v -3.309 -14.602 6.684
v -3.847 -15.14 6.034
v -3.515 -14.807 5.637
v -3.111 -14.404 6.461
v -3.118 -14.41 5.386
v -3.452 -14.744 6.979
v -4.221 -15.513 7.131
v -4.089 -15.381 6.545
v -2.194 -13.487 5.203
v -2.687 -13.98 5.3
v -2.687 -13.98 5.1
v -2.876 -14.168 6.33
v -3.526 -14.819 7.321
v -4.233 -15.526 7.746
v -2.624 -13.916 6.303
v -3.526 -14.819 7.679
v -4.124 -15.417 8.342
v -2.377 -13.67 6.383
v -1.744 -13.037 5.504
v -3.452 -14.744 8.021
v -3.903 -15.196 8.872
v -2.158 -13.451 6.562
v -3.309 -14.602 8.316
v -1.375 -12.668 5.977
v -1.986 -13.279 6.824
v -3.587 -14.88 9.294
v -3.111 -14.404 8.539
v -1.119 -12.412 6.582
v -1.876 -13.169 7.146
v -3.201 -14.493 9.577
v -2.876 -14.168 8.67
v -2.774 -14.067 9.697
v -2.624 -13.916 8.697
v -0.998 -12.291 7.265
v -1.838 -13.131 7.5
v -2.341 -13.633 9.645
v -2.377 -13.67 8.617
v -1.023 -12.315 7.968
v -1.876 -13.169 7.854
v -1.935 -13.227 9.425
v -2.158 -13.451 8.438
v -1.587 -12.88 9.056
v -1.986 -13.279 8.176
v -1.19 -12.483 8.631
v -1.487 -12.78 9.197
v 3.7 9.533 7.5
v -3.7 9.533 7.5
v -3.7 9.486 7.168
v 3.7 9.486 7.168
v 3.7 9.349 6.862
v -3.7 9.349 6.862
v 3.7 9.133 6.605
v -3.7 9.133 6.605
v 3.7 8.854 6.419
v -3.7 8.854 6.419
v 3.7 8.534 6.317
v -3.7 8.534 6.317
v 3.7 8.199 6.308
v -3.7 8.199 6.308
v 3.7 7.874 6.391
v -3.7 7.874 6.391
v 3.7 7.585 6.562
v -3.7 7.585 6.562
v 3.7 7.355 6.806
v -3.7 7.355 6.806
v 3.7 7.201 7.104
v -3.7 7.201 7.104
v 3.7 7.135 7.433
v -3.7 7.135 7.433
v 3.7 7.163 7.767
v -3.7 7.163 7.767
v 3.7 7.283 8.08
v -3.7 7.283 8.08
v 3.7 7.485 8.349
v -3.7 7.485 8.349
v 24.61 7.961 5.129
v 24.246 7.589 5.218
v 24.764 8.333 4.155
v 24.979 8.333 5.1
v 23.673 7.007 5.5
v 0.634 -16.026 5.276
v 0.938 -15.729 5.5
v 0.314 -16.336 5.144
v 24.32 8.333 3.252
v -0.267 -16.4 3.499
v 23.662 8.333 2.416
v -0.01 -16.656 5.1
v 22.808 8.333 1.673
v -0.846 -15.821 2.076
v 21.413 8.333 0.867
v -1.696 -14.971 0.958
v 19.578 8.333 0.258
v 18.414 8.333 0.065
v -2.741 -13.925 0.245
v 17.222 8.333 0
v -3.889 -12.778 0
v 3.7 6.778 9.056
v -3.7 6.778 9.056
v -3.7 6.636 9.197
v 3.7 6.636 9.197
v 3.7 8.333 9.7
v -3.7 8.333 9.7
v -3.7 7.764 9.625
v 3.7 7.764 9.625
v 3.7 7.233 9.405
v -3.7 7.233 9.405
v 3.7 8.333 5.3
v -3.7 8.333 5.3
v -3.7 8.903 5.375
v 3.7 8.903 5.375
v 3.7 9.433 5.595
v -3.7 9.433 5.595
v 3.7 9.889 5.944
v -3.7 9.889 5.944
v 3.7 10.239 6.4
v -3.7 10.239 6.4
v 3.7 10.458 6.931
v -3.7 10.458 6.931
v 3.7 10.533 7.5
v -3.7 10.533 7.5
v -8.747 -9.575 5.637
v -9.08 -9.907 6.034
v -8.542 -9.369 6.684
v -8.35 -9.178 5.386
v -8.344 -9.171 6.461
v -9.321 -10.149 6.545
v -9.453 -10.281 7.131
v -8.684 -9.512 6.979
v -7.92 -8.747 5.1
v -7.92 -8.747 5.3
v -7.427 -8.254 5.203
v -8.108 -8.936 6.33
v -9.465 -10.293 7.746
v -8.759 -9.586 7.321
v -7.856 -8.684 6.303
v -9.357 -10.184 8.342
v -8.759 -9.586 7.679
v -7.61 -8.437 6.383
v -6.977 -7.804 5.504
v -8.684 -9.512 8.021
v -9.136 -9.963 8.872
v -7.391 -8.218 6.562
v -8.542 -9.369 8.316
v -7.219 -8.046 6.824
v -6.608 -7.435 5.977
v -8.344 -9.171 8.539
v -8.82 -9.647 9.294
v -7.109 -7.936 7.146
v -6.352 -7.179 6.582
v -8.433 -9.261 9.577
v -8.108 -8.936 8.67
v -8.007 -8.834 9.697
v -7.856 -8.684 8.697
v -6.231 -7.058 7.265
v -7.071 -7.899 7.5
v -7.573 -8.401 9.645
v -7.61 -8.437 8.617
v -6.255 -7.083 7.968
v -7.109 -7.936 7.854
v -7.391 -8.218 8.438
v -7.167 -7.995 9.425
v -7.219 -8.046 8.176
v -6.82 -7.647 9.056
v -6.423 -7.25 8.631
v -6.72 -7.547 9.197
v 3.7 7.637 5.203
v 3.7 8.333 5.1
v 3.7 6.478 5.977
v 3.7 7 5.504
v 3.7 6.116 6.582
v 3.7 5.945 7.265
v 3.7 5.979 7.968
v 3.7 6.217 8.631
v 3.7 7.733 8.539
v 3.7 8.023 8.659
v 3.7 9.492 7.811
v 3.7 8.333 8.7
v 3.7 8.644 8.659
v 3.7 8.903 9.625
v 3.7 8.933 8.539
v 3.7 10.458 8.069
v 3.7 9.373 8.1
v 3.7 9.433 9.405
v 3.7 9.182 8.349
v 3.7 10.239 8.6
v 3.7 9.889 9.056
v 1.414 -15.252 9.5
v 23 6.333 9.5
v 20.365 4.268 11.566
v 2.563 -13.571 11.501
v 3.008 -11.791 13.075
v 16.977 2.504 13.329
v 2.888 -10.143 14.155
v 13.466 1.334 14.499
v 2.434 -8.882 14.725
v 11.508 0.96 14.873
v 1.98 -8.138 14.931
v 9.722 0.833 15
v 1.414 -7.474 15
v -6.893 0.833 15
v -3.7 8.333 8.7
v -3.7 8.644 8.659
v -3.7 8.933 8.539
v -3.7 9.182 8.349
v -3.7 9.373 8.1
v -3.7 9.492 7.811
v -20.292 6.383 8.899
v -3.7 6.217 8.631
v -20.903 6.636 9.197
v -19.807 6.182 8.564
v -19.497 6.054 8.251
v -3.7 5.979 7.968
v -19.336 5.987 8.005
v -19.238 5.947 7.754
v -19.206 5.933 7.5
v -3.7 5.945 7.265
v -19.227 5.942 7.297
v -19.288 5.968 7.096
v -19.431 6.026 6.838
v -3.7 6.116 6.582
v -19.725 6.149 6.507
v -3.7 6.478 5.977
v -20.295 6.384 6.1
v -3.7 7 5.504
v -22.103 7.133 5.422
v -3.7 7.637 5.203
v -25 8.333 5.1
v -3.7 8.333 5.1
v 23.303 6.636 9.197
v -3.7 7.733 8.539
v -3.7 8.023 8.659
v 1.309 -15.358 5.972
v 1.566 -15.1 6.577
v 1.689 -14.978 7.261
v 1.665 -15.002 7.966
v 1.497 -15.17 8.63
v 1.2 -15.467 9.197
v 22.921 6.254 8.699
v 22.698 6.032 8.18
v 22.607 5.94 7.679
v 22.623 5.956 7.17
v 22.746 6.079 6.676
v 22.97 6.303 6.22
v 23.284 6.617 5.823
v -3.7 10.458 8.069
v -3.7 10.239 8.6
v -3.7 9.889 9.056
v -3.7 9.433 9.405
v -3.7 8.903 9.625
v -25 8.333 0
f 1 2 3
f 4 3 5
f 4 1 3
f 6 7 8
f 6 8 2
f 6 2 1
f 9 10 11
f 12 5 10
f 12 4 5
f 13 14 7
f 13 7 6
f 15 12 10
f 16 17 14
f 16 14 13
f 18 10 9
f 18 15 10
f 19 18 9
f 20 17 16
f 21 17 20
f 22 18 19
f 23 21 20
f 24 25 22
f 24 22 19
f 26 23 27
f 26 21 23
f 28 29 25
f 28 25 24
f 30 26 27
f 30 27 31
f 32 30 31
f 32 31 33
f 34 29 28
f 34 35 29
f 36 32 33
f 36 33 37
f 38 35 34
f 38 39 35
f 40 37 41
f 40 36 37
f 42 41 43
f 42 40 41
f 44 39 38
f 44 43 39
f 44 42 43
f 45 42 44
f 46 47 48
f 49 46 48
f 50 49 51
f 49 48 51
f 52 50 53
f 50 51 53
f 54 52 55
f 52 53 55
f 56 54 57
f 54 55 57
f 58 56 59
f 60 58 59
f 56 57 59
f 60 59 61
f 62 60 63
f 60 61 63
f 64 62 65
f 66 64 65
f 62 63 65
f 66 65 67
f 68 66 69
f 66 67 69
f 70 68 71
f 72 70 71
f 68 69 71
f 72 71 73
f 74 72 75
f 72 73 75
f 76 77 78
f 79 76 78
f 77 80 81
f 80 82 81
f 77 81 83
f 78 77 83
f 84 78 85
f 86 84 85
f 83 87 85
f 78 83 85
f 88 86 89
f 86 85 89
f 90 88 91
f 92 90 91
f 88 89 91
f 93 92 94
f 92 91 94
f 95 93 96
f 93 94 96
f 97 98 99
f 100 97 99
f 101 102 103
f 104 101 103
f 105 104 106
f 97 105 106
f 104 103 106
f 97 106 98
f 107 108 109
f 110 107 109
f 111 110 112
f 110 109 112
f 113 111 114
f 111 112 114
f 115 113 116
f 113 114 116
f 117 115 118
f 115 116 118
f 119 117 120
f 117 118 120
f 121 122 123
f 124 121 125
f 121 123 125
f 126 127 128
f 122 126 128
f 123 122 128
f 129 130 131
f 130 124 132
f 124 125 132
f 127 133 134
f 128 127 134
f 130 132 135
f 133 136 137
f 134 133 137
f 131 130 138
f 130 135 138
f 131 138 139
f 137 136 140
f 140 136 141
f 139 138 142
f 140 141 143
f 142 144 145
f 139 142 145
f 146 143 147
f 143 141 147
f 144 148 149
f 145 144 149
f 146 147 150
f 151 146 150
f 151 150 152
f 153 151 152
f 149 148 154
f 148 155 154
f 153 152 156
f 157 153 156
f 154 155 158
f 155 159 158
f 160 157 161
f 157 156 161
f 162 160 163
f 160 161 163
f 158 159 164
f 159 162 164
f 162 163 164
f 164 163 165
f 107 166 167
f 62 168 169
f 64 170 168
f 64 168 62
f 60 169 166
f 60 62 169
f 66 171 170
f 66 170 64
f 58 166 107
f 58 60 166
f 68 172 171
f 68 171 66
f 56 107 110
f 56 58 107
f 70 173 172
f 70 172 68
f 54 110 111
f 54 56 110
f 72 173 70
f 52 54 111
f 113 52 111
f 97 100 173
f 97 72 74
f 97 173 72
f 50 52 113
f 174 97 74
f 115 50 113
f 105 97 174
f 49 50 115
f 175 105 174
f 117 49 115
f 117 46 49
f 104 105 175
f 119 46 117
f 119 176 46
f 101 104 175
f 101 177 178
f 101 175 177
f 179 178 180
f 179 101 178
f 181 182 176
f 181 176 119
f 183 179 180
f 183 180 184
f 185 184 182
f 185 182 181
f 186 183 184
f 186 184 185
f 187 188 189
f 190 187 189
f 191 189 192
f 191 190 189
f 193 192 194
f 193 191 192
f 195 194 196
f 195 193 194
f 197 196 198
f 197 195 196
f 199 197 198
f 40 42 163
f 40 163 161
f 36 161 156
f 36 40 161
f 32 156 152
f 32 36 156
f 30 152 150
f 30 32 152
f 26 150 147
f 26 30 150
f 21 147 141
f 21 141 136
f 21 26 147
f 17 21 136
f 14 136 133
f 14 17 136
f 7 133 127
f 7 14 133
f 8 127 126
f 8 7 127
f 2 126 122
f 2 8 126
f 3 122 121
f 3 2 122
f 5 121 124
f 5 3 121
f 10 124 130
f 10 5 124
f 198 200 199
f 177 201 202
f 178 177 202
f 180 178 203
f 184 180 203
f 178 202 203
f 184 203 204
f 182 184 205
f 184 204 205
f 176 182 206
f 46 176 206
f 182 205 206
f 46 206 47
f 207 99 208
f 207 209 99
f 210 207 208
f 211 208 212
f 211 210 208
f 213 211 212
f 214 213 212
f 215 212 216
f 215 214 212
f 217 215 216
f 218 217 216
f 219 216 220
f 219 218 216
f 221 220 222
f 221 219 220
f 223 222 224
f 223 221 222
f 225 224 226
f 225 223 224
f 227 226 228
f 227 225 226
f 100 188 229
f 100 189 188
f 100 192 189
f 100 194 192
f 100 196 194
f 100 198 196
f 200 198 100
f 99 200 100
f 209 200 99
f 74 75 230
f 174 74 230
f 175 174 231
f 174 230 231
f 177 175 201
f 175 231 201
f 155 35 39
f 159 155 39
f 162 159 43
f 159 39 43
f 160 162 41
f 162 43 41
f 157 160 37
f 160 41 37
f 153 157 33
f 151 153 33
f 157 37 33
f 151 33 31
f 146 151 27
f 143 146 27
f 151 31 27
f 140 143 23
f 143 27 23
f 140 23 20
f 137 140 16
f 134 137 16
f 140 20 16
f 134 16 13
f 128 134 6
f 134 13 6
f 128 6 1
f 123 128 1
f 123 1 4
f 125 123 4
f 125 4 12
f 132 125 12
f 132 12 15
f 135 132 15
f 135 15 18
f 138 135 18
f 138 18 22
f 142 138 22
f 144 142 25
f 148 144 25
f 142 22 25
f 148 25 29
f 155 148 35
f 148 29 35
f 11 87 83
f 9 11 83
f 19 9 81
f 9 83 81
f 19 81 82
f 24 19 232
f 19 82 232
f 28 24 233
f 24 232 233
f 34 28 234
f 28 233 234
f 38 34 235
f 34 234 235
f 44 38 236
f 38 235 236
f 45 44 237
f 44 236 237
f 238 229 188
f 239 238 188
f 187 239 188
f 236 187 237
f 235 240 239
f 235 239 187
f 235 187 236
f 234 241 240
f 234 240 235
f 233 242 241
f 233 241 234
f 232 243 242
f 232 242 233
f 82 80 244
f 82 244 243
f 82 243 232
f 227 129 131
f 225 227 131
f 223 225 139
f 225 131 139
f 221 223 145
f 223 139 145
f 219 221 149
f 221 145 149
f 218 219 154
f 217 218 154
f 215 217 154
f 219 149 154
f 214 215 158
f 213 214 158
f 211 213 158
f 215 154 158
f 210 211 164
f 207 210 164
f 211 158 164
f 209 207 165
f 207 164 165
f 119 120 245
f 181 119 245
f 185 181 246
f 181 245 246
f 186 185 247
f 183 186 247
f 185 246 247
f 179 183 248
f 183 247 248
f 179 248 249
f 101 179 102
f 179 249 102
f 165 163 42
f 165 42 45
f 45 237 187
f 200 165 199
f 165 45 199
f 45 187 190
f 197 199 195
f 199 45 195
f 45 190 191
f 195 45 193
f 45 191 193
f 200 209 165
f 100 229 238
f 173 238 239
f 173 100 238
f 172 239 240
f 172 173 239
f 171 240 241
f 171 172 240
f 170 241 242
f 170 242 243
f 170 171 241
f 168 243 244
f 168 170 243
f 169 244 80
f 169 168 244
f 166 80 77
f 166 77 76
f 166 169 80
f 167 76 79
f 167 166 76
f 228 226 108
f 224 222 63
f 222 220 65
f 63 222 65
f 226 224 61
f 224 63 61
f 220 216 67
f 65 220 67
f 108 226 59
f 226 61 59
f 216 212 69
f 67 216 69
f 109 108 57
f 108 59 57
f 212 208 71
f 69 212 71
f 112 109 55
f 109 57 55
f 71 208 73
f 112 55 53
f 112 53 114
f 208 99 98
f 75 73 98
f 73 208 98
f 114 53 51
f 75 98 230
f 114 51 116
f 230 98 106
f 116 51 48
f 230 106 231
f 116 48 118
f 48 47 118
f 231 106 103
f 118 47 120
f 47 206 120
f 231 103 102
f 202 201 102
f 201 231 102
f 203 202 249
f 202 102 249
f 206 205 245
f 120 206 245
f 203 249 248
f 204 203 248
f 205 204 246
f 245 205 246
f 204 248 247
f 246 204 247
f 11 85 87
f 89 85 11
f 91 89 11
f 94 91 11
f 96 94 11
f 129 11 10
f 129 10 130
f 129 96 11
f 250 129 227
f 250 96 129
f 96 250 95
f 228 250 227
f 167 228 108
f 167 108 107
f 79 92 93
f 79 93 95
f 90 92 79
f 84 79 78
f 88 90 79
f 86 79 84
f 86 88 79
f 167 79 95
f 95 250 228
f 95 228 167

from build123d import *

# Parameters (mm, degrees)
BOSS_EXTRUDE1_DEPTH      = 15
CUT_EXTRUDE1_DEPTH       = 34.582402799
CUT_EXTRUDE1_DEPTH_BACK  = 34.582402799
BOSS_EXTRUDE2_DEPTH      = 3.7
BOSS_EXTRUDE2_DEPTH_BACK = 3.7
SKETCH2_5_R              = 1.2
CUT_EXTRUDE2_DEPTH       = 42.134683932
BOSS_EXTRUDE3_START      = -3.8
SKETCH4_3_R              = 1.2
BOSS_EXTRUDE3_DEPTH      = 7.4
FILLET1_R                = 5.5
FILLET2_R                = 5.5


with BuildPart() as part:
    # Sketch1 → Boss-Extrude1 (new body)
    with BuildSketch(Plane(origin=(0, 0, 0), x_dir=(0, 1, 0), z_dir=(0, 0, 1))):
        Polygon((8.333333333, 25), (8.333333333, -25), (-16.666666667, 0), align=None)
    extrude(amount=BOSS_EXTRUDE1_DEPTH)

    # Sketch2 → Cut-Extrude1 (cut, two sides: drawn at the far end of the back side and taken through both)
    with BuildSketch(Plane.YZ.offset(-CUT_EXTRUDE1_DEPTH_BACK)):
        with BuildLine():
            Line((8.333333333, 15), (0.833333333, 15))
            Line((0.833333333, 15), (6.636277058, 9.197056275))
            ThreePointArc((6.636277058, 9.197056275), (9.251773571, 5.282689122), (8.333333333, 9.9))
            Line((8.333333333, 9.9), (8.333333333, 15))
        make_face()
    extrude(amount=CUT_EXTRUDE1_DEPTH + CUT_EXTRUDE1_DEPTH_BACK, mode=Mode.SUBTRACT)

    # Sketch2<5> → Boss-Extrude2 (add, two sides: drawn at the far end of the back side and taken through both)
    with BuildSketch(Plane.YZ.offset(-BOSS_EXTRUDE2_DEPTH_BACK)):
        with BuildLine():
            Line((6.777698415, 9.055634919), (6.636277058, 9.197056275))
            ThreePointArc((6.636277058, 9.197056275), (6.116022455, 6.581559762), (8.333333333, 5.1))
            Line((8.333333333, 5.1), (8.333333333, 5.3))
            ThreePointArc((8.333333333, 5.3), (10.365868305, 8.341903551), (6.777698415, 9.055634919))
        make_face()
        with Locations((8.333333333, 7.5)):
            Circle(SKETCH2_5_R, mode=Mode.SUBTRACT)
    extrude(amount=BOSS_EXTRUDE2_DEPTH + BOSS_EXTRUDE2_DEPTH_BACK)

    # Sketch4 → Cut-Extrude2 (cut, through all)
    with BuildSketch(Plane(origin=(8.333333333, -8.333333333, 0), x_dir=(0.7071067811865486, 0.7071067811865465, 0), z_dir=(0.7071067811865465, -0.7071067811865486, 0))):
        with BuildLine():
            ThreePointArc((-11.78511302, 9.9), (-12.703553257, 5.282689122), (-10.088056745, 9.197056275))
            Line((-10.088056745, 9.197056275), (-4.28511302, 15))
            Line((-4.28511302, 15), (-11.78511302, 15))
            Line((-11.78511302, 15), (-11.78511302, 9.9))
        make_face()
    extrude(amount=-CUT_EXTRUDE2_DEPTH, mode=Mode.SUBTRACT)

    # Sketch4<3> → Boss-Extrude3 (add)
    with BuildSketch(Plane(origin=(8.333333333, -8.333333333, 0), x_dir=(0.7071067811865486, 0.7071067811865465, 0), z_dir=(0.7071067811865465, -0.7071067811865486, 0)).offset(BOSS_EXTRUDE3_START)):
        with BuildLine():
            ThreePointArc((-10.229478101, 9.055634919), (-13.817647991, 8.341903551), (-11.78511302, 5.3))
            Line((-11.78511302, 5.3), (-11.78511302, 5.1))
            ThreePointArc((-11.78511302, 5.1), (-9.567802142, 6.581559762), (-10.088056745, 9.197056275))
            Line((-10.088056745, 9.197056275), (-10.229478101, 9.055634919))
        make_face()
        with Locations((-11.78511302, 7.5)):
            Circle(SKETCH4_3_R, mode=Mode.SUBTRACT)
    extrude(amount=-BOSS_EXTRUDE3_DEPTH)

    # Fillet1
    fillet1_edges = [part.edges().sort_by_distance(p)[0] for p in [
        (12.5, -4.166666667, 0),
    ]]
    fillet(fillet1_edges, radius=FILLET1_R)

    # Fillet2
    fillet2_edges = [part.edges().sort_by_distance(p)[0] for p in [
        (11.401650429, -5.265016237, 15),
    ]]
    fillet(fillet2_edges, radius=FILLET2_R)


solid = part.part
